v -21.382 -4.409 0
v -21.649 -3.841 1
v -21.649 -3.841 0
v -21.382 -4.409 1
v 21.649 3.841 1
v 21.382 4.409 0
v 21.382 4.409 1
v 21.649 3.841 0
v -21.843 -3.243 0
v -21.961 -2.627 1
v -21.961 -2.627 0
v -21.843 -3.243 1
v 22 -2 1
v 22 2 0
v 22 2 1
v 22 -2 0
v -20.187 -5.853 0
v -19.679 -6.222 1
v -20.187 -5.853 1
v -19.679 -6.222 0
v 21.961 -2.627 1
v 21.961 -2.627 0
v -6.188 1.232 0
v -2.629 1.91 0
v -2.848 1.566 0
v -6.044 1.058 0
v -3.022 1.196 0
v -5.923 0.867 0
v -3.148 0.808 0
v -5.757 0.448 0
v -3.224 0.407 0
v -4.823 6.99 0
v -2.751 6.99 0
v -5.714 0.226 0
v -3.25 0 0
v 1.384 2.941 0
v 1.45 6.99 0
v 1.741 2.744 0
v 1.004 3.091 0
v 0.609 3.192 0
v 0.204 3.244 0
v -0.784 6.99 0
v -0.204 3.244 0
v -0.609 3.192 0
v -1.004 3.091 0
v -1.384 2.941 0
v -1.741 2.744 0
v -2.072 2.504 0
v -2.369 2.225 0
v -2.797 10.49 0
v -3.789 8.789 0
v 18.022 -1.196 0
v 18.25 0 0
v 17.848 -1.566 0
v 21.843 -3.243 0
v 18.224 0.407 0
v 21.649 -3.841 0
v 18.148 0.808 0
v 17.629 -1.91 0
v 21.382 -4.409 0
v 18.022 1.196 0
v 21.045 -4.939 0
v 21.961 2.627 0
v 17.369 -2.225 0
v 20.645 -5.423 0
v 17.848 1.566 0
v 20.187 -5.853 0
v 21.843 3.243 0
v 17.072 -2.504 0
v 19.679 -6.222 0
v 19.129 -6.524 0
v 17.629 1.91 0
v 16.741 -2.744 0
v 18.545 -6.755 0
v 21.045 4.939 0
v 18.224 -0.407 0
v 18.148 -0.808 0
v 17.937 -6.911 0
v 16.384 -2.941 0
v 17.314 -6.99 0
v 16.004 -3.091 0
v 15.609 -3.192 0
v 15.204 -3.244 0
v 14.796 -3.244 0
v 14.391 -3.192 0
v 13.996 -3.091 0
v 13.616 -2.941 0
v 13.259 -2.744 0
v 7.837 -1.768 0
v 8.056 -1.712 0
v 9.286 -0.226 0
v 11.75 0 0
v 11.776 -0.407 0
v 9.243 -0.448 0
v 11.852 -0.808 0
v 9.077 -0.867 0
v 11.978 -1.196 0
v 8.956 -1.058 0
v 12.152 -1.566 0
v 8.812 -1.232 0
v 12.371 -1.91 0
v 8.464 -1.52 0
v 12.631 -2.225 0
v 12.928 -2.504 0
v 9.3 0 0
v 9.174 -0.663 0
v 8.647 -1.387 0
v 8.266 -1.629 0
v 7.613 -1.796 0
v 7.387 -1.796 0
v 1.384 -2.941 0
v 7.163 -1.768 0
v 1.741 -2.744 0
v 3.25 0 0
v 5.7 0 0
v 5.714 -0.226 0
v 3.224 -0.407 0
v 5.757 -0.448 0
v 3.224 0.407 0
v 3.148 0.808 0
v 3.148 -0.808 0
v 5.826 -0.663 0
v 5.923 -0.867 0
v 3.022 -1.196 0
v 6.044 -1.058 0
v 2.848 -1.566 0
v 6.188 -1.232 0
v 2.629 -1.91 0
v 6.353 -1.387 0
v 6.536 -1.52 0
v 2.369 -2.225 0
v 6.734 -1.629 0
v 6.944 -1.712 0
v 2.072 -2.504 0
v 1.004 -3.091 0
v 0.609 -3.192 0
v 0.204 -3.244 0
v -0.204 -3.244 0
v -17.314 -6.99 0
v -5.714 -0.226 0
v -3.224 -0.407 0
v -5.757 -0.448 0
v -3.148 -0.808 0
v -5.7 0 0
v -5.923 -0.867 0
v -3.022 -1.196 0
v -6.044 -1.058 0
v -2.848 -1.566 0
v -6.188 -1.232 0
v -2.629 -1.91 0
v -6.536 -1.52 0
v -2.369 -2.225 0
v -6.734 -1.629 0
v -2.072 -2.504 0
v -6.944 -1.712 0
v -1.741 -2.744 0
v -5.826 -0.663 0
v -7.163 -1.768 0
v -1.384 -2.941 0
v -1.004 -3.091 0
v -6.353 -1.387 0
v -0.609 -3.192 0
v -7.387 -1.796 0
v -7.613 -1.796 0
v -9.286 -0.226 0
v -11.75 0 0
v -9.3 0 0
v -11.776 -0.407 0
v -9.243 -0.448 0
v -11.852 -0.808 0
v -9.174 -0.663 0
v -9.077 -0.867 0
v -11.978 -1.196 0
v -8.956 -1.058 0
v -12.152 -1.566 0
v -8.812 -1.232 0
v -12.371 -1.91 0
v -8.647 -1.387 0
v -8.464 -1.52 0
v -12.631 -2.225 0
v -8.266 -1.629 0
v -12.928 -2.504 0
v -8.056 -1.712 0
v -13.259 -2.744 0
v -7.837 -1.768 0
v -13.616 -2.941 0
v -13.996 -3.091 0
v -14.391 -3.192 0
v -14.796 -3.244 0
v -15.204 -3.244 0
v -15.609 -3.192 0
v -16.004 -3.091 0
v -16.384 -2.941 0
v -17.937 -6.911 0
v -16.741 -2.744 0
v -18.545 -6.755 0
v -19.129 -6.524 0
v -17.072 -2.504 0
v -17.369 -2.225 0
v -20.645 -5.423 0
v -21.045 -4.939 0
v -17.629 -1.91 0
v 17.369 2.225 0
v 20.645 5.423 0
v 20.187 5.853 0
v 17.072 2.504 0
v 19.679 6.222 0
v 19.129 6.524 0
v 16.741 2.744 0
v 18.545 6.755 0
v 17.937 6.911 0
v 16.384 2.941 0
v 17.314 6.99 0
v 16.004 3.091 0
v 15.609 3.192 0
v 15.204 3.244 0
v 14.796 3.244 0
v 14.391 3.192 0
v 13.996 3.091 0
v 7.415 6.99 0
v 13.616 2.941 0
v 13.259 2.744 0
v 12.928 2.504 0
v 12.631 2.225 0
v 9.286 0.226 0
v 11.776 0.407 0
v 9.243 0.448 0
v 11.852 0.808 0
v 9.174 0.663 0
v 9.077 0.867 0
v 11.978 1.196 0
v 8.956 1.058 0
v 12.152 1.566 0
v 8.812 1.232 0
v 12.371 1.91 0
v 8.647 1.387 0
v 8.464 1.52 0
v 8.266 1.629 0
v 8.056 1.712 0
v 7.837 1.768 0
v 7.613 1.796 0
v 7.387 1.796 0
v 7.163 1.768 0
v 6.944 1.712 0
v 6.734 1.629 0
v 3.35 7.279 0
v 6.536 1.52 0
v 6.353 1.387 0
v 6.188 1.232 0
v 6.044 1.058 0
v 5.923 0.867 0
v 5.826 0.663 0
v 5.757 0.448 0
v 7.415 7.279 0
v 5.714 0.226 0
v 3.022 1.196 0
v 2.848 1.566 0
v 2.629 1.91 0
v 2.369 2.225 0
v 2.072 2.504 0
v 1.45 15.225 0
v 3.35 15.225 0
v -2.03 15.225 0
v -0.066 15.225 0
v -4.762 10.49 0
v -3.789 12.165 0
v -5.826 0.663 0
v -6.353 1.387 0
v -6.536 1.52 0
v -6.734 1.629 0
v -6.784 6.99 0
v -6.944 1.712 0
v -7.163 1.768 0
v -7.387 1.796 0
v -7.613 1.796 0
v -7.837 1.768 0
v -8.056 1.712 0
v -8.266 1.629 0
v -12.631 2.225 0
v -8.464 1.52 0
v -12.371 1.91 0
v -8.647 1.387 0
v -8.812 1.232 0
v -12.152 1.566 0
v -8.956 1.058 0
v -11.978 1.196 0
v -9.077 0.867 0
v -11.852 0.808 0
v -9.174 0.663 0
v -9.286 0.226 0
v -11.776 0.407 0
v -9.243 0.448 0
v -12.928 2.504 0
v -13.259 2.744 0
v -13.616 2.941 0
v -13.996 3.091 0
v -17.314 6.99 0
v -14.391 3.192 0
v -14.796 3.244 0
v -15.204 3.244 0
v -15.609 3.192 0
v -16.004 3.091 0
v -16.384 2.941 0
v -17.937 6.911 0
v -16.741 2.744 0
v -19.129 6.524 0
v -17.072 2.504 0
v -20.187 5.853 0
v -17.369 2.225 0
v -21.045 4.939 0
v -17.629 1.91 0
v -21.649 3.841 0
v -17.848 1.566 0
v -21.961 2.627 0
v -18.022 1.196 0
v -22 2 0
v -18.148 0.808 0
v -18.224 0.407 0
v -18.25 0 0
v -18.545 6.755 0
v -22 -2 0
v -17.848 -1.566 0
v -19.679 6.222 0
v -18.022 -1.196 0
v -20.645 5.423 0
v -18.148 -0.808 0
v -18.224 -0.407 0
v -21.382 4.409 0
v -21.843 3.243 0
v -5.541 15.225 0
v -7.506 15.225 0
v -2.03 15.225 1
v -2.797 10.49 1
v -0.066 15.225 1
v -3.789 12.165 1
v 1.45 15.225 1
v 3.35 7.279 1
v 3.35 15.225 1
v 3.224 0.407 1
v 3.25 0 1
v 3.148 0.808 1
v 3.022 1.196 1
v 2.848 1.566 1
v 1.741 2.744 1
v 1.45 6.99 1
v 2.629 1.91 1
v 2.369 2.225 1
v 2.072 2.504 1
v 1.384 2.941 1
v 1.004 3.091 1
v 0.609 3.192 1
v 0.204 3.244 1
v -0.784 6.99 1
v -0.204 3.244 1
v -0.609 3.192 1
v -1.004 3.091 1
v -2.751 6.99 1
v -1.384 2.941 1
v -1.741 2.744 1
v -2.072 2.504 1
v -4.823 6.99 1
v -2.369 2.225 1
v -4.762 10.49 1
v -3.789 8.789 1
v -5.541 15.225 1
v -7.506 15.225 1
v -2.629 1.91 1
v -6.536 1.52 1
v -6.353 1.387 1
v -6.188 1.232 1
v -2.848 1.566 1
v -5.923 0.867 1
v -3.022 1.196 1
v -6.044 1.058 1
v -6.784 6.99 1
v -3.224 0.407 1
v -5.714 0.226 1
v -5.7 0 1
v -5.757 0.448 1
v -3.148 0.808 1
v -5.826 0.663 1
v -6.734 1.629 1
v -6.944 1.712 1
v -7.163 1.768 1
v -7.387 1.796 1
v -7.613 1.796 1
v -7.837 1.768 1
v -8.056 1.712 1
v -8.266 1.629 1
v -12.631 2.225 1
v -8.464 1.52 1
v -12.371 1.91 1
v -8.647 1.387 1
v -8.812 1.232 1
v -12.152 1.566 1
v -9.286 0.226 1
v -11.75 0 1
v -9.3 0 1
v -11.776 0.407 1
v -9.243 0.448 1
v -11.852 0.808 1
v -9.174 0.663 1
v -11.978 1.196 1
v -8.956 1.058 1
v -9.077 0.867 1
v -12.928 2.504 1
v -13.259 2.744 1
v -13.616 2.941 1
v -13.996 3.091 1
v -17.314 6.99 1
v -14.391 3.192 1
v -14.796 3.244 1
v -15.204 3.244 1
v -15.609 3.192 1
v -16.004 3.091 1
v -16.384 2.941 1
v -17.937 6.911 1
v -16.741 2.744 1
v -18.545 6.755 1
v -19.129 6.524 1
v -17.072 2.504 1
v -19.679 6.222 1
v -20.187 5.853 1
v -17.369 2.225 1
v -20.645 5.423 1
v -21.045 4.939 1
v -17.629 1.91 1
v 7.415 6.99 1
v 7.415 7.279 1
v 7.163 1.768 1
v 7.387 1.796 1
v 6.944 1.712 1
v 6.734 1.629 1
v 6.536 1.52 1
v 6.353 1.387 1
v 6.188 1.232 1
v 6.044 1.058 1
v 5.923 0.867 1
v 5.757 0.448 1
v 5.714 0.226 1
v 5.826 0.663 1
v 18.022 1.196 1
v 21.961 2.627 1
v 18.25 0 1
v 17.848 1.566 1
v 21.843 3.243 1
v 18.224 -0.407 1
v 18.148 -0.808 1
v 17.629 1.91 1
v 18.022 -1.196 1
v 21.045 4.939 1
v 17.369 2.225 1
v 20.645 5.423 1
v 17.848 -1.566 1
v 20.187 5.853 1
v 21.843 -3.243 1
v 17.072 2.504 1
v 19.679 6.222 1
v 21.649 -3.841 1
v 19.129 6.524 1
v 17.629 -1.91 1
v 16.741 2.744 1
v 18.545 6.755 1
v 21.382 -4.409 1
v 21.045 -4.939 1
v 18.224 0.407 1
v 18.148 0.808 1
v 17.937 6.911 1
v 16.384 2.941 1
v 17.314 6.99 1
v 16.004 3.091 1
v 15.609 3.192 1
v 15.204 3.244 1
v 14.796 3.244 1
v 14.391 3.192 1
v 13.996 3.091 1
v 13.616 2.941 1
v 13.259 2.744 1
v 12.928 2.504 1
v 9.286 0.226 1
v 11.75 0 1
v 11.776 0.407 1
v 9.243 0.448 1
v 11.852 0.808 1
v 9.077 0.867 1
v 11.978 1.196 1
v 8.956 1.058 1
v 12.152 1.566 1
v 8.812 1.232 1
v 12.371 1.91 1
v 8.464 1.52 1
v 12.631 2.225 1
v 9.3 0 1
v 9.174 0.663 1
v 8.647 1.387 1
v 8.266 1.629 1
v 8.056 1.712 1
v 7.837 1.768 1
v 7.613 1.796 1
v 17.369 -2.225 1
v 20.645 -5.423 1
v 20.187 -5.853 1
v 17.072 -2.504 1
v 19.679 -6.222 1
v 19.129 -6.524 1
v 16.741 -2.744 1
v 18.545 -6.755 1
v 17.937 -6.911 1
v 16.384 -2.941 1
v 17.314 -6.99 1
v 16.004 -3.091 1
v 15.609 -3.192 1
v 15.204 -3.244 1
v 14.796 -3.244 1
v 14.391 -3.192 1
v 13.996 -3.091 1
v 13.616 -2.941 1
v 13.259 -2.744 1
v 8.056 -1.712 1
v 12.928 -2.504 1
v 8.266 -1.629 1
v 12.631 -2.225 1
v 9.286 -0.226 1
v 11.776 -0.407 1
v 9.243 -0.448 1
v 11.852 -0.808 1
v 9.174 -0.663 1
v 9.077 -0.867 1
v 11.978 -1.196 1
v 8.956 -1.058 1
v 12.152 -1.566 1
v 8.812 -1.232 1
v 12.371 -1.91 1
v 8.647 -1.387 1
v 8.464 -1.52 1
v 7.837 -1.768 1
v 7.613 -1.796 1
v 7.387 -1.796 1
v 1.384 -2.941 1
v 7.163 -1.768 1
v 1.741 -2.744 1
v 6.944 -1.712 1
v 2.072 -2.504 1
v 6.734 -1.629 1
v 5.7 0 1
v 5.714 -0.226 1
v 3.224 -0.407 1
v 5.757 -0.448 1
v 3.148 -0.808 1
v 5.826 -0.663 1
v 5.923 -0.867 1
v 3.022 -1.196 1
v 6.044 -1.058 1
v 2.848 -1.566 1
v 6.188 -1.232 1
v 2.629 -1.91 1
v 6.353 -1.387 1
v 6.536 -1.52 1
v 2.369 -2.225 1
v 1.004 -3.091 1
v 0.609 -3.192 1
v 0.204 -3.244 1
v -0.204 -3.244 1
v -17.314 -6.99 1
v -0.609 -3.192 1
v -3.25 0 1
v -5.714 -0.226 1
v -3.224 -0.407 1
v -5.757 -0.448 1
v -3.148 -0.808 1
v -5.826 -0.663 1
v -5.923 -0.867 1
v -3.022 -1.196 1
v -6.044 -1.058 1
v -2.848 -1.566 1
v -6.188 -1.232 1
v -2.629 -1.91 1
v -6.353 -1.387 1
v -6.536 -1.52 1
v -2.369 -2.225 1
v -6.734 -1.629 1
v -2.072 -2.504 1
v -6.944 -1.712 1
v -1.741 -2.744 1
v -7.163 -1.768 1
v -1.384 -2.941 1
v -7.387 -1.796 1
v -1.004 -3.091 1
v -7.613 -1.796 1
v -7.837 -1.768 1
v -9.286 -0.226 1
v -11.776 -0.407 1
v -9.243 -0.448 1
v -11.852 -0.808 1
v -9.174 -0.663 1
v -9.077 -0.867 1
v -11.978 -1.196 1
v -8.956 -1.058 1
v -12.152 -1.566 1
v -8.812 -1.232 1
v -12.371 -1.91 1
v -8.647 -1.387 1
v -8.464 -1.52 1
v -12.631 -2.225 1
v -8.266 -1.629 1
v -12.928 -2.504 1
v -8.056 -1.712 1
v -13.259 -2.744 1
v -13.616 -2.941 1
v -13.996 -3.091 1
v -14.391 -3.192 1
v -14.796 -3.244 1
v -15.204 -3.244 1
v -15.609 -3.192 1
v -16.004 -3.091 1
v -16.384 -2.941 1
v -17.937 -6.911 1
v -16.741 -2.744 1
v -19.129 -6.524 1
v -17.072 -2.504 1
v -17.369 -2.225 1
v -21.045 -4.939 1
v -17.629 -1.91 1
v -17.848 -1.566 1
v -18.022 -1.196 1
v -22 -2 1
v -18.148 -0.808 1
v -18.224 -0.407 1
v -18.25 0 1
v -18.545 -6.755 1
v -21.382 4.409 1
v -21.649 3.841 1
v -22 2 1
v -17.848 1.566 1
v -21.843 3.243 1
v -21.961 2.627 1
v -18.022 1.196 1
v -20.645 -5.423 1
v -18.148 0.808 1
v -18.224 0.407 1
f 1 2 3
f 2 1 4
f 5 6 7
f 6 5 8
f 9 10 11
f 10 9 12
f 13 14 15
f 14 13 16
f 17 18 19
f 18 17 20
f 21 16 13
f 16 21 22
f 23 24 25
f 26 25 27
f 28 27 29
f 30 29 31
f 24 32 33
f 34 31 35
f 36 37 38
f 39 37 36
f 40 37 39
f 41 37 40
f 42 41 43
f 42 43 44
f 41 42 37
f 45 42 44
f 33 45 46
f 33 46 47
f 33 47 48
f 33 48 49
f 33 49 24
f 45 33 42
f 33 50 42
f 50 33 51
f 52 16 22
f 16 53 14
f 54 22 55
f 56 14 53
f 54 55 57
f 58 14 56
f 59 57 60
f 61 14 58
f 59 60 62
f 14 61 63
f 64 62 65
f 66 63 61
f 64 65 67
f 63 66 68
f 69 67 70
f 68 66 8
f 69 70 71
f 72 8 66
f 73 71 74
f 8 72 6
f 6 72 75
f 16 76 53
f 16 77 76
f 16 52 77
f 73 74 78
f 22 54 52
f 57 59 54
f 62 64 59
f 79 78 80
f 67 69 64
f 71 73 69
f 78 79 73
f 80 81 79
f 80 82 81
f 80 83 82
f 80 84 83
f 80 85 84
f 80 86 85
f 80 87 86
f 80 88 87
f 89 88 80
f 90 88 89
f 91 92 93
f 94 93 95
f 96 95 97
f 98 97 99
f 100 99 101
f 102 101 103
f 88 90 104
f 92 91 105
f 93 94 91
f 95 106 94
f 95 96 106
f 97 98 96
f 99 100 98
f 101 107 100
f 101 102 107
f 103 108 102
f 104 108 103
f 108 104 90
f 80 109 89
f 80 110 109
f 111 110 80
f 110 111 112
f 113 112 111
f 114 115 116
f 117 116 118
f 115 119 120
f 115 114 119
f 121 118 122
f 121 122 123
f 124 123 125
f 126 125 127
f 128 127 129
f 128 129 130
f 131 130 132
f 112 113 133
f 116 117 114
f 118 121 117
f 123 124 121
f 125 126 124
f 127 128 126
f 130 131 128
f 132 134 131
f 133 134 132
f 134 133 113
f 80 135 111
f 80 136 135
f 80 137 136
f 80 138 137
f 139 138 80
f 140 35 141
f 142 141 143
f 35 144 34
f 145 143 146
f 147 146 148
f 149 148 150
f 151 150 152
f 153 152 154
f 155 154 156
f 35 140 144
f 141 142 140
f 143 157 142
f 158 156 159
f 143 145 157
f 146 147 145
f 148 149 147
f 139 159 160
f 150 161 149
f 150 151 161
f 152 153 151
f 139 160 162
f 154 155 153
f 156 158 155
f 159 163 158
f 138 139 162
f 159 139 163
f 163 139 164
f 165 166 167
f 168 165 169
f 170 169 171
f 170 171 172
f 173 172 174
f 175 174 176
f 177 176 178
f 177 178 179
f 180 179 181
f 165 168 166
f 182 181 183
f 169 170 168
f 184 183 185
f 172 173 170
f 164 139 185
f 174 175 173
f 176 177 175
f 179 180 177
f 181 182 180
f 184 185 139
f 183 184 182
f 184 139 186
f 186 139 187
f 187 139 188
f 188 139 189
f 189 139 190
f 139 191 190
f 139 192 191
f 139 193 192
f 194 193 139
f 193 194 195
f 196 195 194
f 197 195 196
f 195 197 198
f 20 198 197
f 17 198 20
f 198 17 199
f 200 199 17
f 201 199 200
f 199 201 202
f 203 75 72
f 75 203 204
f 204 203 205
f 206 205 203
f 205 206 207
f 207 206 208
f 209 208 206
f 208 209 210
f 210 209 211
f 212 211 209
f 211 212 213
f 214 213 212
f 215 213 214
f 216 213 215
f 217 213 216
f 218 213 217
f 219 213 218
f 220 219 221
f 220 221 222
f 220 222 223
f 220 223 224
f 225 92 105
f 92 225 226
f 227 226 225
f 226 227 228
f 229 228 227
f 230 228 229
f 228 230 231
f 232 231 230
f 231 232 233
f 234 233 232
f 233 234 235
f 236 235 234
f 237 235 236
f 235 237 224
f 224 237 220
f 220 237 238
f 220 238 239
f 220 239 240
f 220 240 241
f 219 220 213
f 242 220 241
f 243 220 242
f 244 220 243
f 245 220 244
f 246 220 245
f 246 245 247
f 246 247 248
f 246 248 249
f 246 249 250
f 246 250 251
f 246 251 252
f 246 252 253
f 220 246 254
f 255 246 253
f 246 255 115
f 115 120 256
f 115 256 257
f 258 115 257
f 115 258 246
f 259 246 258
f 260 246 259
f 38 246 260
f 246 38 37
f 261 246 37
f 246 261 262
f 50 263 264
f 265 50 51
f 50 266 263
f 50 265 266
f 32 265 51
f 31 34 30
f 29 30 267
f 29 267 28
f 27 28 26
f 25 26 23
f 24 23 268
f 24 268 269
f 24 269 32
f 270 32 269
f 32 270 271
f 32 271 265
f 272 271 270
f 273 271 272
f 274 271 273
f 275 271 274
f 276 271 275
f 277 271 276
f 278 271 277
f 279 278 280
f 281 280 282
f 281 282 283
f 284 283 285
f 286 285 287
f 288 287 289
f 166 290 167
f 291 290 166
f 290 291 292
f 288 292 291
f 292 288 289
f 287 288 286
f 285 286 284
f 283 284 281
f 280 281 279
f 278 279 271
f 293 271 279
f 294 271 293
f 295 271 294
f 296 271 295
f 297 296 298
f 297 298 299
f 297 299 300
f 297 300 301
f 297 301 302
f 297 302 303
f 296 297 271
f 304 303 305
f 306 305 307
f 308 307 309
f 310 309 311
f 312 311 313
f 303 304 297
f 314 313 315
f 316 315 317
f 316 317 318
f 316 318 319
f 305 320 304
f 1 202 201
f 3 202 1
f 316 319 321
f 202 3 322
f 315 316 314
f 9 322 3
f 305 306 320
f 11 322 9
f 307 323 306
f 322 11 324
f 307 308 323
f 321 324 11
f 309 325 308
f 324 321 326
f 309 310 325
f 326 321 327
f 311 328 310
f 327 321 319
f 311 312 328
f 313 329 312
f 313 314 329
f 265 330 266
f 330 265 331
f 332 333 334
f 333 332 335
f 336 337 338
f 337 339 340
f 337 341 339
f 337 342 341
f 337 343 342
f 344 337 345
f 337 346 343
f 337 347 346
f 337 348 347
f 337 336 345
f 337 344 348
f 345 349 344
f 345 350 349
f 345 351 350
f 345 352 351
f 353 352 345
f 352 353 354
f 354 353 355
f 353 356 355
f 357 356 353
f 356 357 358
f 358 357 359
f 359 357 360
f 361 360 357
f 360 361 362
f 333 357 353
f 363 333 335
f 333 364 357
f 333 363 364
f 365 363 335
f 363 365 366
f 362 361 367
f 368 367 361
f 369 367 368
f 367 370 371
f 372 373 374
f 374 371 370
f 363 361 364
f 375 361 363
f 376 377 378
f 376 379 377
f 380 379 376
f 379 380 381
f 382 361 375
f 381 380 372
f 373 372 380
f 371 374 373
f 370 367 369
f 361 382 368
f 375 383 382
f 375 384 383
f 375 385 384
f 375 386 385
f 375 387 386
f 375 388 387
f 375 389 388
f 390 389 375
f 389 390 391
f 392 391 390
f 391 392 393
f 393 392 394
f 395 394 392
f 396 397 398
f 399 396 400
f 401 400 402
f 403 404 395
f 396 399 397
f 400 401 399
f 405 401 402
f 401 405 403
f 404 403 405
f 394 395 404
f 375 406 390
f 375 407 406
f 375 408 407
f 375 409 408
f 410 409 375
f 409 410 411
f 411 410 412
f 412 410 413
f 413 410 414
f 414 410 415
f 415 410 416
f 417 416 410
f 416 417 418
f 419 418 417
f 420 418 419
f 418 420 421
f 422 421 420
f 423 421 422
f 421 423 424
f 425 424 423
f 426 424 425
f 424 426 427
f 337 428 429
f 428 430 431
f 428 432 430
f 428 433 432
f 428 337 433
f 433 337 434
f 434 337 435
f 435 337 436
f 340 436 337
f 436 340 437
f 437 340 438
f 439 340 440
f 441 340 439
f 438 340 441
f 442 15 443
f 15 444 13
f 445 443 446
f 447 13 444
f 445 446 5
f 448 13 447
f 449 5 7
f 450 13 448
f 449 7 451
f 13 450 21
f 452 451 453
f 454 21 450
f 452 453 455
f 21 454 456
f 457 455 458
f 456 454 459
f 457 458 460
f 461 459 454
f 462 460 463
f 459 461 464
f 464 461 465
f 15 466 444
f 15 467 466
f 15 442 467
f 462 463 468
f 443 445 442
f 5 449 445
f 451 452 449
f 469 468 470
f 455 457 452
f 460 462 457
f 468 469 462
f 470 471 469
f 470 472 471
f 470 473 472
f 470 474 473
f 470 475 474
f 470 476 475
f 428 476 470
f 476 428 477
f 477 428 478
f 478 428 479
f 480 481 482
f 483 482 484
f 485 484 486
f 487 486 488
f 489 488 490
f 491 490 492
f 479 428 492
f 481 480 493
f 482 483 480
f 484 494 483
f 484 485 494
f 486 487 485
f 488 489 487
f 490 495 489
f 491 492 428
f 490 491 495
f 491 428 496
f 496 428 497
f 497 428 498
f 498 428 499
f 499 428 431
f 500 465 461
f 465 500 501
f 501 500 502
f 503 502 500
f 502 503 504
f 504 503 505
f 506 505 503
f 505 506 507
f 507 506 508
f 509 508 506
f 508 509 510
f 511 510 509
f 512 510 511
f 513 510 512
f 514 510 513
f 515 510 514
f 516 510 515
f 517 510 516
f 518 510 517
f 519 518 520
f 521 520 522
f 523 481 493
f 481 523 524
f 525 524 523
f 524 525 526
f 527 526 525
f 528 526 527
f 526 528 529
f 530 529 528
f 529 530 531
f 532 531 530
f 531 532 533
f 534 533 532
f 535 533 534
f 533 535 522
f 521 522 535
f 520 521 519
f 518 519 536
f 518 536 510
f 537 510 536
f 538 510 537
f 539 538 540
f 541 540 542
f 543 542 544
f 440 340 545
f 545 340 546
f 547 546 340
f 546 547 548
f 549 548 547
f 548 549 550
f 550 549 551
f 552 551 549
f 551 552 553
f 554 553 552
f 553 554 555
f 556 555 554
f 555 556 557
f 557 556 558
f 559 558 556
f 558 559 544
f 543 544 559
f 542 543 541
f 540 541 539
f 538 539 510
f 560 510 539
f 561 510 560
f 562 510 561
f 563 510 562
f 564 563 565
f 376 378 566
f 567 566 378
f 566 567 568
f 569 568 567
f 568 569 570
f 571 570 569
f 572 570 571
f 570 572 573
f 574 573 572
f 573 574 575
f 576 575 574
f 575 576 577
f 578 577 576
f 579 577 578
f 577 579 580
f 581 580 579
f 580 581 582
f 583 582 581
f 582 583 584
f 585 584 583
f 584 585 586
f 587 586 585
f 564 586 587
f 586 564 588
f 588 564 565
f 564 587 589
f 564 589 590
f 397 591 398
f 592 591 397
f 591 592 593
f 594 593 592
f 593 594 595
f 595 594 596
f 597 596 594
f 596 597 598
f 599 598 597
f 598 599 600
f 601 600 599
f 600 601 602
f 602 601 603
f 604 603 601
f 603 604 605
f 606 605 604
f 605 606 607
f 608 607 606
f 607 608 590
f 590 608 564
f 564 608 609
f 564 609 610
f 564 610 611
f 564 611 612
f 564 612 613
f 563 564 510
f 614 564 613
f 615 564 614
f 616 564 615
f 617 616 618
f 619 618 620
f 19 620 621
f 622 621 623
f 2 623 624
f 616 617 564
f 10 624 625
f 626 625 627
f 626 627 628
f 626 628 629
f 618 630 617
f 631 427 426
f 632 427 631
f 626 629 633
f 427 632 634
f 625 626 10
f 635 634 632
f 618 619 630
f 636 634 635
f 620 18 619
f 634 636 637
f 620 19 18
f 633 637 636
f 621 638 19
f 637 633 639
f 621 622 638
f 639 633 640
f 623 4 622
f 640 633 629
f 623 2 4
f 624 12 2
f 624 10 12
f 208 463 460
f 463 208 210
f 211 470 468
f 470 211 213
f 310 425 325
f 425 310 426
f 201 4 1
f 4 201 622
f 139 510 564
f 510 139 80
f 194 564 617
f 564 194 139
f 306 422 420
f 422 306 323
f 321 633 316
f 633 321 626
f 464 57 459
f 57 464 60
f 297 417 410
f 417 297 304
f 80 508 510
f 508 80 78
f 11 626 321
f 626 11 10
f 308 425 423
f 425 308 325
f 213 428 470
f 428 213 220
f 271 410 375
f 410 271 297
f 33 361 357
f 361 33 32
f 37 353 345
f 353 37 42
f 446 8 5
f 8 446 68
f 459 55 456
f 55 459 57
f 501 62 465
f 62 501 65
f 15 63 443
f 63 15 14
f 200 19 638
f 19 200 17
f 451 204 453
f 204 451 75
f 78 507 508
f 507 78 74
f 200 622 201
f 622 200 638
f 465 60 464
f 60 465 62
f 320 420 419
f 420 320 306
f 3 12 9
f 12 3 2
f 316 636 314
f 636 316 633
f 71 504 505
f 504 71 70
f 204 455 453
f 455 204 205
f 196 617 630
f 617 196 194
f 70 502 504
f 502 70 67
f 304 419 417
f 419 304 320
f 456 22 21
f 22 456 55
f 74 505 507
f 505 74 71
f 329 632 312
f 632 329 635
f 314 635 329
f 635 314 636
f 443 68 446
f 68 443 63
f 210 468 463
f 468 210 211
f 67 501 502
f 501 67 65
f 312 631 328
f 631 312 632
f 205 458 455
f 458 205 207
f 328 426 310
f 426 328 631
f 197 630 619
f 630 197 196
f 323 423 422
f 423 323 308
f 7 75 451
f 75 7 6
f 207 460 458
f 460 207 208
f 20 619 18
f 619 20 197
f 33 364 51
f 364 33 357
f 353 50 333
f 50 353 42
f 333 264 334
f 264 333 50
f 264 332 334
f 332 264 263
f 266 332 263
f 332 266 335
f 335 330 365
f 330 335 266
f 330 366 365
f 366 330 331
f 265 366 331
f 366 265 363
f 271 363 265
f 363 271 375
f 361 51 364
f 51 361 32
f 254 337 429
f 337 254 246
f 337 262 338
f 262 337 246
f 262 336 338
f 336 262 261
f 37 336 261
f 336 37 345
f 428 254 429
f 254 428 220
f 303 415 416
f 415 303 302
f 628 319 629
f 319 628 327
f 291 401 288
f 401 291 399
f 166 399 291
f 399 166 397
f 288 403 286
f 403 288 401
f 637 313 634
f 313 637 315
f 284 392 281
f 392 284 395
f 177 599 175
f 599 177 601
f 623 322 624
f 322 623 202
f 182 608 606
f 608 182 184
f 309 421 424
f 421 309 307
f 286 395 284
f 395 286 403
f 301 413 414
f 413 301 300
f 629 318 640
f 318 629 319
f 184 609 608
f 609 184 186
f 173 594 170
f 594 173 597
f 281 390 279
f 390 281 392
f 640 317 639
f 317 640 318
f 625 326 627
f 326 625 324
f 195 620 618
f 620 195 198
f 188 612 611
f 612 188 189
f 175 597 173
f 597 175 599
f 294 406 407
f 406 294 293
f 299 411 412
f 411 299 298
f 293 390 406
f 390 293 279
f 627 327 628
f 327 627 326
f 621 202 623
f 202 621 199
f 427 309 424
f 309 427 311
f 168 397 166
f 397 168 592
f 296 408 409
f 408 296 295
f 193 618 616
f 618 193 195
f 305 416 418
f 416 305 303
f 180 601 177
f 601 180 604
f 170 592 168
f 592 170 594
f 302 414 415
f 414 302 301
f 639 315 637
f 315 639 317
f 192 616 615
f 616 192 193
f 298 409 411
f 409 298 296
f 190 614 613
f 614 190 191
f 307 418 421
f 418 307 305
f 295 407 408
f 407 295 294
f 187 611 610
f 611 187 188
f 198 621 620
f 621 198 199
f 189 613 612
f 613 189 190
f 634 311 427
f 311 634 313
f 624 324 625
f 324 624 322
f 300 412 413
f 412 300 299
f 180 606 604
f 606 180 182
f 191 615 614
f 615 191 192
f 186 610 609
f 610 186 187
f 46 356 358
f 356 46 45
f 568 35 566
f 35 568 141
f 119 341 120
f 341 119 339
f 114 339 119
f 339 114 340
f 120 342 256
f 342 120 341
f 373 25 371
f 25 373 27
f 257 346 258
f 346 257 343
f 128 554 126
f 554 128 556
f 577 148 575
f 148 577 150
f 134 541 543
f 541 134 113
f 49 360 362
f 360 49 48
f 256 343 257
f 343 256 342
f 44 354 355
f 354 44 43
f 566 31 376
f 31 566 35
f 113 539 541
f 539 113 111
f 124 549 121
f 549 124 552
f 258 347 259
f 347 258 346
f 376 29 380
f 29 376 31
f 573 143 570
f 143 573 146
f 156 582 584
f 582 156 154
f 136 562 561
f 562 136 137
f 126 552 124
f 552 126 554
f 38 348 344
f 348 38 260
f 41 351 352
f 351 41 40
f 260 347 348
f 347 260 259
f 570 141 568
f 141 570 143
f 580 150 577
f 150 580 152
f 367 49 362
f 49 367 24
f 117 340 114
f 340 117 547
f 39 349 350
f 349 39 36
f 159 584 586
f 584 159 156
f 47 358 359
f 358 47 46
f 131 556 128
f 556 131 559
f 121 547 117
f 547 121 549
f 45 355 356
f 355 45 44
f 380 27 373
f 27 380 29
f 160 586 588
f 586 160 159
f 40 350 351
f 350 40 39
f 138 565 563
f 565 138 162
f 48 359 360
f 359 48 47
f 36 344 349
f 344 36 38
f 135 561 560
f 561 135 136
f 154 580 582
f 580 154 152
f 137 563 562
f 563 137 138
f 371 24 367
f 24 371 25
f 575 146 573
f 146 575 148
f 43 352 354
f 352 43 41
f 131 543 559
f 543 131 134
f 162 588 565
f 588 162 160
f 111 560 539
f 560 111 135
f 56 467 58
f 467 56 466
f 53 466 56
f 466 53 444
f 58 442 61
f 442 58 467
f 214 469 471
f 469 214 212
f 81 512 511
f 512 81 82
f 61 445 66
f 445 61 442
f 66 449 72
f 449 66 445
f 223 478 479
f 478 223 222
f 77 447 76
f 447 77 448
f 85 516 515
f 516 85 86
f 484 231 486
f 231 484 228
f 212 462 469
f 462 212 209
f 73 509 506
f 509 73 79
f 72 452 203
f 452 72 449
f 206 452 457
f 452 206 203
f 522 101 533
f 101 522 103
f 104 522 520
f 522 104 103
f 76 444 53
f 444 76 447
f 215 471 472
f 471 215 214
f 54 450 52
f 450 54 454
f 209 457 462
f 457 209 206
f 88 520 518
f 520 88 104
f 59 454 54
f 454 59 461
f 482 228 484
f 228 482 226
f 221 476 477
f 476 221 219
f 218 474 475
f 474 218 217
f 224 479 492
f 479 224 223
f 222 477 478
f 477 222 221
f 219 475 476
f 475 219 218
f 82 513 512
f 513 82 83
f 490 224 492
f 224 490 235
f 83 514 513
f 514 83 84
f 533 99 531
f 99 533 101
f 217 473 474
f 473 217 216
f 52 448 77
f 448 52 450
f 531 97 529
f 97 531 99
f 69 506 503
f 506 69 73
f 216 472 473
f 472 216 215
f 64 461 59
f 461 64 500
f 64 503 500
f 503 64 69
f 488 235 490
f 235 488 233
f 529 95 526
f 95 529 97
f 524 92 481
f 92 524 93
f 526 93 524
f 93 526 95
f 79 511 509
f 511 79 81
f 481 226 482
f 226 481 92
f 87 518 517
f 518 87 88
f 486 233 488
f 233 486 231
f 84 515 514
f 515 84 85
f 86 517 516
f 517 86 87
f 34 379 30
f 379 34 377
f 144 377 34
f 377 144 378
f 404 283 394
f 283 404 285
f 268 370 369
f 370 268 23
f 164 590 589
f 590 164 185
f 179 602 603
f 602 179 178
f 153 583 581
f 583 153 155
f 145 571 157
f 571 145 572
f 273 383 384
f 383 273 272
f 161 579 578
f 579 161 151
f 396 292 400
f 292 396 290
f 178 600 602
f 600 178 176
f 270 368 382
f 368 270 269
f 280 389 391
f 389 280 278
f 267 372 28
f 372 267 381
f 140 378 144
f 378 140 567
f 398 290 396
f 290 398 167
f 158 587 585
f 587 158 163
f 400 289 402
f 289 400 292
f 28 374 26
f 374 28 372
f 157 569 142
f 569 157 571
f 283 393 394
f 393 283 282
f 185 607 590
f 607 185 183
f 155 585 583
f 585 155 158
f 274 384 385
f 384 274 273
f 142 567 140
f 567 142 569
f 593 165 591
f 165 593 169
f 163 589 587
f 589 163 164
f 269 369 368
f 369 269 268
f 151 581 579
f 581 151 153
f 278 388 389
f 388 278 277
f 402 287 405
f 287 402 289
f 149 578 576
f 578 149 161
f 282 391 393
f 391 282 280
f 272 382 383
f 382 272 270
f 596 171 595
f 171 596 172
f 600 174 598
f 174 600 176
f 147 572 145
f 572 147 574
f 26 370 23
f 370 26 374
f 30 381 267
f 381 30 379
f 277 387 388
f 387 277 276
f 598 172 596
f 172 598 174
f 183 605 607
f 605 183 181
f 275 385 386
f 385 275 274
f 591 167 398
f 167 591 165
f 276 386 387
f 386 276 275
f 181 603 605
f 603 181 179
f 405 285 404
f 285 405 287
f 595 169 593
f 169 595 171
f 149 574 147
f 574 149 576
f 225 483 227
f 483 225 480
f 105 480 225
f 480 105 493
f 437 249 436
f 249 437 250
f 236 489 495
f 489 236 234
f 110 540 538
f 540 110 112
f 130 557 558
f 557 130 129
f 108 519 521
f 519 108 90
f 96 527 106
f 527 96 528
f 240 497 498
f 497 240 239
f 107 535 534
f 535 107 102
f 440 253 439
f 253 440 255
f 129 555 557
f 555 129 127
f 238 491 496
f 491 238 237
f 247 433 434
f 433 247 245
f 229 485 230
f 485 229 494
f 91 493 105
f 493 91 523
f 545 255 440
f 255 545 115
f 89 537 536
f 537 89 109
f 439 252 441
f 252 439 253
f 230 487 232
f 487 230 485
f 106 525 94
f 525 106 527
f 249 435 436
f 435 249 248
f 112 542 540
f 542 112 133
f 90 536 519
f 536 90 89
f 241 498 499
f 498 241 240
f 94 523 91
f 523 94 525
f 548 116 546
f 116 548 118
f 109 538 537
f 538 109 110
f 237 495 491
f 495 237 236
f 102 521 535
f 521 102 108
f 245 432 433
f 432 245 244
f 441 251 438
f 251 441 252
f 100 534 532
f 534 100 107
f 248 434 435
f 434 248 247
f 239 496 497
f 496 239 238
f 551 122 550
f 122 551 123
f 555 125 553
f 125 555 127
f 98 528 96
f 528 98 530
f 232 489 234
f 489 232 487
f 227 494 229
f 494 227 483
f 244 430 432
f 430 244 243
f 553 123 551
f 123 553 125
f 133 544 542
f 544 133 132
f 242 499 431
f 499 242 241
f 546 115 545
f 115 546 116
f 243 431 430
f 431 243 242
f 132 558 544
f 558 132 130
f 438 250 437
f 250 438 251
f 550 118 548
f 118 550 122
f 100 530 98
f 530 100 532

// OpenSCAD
$fn = 50;


difference() {
	union() {
		hull() {
			translate(v = [-17.0000000000, 2.0000000000, 0]) {
				cylinder(h = 1, r = 5);
			}
			translate(v = [17.0000000000, 2.0000000000, 0]) {
				cylinder(h = 1, r = 5);
			}
			translate(v = [-17.0000000000, -2.0000000000, 0]) {
				cylinder(h = 1, r = 5);
			}
			translate(v = [17.0000000000, -2.0000000000, 0]) {
				cylinder(h = 1, r = 5);
			}
		}
		translate(v = [0, 15.0000000000, 0]) {
			linear_extrude(height = 1) {
				text(font = "DejaVu Sans Mono:style=Bold", halign = "center", size = 9.5000000000, text = "XL", valign = "top");
			}
		}
	}
	union() {
		translate(v = [-15.0000000000, 0.0000000000, 0]) {
			translate(v = [0, 0, -100]) {
				cylinder(h = 200, r = 3.2500000000);
			}
		}
		translate(v = [0, 0, -100]) {
			cylinder(h = 200, r = 3.2500000000);
		}
		translate(v = [15.0000000000, 0.0000000000, 0]) {
			translate(v = [0, 0, -100]) {
				cylinder(h = 200, r = 3.2500000000);
			}
		}
		translate(v = [-15.0000000000, 0.0000000000, 0]) {
			translate(v = [0, 0, -100]) {
				cylinder(h = 200, r = 1.8000000000);
			}
		}
		translate(v = [-7.5000000000, 0.0000000000, 0]) {
			translate(v = [0, 0, -100]) {
				cylinder(h = 200, r = 1.8000000000);
			}
		}
		translate(v = [0, 0, -100]) {
			cylinder(h = 200, r = 1.8000000000);
		}
		translate(v = [7.5000000000, 0.0000000000, 0]) {
			translate(v = [0, 0, -100]) {
				cylinder(h = 200, r = 1.8000000000);
			}
		}
		translate(v = [15.0000000000, 0.0000000000, 0]) {
			translate(v = [0, 0, -100]) {
				cylinder(h = 200, r = 1.8000000000);
			}
		}
	}
}
